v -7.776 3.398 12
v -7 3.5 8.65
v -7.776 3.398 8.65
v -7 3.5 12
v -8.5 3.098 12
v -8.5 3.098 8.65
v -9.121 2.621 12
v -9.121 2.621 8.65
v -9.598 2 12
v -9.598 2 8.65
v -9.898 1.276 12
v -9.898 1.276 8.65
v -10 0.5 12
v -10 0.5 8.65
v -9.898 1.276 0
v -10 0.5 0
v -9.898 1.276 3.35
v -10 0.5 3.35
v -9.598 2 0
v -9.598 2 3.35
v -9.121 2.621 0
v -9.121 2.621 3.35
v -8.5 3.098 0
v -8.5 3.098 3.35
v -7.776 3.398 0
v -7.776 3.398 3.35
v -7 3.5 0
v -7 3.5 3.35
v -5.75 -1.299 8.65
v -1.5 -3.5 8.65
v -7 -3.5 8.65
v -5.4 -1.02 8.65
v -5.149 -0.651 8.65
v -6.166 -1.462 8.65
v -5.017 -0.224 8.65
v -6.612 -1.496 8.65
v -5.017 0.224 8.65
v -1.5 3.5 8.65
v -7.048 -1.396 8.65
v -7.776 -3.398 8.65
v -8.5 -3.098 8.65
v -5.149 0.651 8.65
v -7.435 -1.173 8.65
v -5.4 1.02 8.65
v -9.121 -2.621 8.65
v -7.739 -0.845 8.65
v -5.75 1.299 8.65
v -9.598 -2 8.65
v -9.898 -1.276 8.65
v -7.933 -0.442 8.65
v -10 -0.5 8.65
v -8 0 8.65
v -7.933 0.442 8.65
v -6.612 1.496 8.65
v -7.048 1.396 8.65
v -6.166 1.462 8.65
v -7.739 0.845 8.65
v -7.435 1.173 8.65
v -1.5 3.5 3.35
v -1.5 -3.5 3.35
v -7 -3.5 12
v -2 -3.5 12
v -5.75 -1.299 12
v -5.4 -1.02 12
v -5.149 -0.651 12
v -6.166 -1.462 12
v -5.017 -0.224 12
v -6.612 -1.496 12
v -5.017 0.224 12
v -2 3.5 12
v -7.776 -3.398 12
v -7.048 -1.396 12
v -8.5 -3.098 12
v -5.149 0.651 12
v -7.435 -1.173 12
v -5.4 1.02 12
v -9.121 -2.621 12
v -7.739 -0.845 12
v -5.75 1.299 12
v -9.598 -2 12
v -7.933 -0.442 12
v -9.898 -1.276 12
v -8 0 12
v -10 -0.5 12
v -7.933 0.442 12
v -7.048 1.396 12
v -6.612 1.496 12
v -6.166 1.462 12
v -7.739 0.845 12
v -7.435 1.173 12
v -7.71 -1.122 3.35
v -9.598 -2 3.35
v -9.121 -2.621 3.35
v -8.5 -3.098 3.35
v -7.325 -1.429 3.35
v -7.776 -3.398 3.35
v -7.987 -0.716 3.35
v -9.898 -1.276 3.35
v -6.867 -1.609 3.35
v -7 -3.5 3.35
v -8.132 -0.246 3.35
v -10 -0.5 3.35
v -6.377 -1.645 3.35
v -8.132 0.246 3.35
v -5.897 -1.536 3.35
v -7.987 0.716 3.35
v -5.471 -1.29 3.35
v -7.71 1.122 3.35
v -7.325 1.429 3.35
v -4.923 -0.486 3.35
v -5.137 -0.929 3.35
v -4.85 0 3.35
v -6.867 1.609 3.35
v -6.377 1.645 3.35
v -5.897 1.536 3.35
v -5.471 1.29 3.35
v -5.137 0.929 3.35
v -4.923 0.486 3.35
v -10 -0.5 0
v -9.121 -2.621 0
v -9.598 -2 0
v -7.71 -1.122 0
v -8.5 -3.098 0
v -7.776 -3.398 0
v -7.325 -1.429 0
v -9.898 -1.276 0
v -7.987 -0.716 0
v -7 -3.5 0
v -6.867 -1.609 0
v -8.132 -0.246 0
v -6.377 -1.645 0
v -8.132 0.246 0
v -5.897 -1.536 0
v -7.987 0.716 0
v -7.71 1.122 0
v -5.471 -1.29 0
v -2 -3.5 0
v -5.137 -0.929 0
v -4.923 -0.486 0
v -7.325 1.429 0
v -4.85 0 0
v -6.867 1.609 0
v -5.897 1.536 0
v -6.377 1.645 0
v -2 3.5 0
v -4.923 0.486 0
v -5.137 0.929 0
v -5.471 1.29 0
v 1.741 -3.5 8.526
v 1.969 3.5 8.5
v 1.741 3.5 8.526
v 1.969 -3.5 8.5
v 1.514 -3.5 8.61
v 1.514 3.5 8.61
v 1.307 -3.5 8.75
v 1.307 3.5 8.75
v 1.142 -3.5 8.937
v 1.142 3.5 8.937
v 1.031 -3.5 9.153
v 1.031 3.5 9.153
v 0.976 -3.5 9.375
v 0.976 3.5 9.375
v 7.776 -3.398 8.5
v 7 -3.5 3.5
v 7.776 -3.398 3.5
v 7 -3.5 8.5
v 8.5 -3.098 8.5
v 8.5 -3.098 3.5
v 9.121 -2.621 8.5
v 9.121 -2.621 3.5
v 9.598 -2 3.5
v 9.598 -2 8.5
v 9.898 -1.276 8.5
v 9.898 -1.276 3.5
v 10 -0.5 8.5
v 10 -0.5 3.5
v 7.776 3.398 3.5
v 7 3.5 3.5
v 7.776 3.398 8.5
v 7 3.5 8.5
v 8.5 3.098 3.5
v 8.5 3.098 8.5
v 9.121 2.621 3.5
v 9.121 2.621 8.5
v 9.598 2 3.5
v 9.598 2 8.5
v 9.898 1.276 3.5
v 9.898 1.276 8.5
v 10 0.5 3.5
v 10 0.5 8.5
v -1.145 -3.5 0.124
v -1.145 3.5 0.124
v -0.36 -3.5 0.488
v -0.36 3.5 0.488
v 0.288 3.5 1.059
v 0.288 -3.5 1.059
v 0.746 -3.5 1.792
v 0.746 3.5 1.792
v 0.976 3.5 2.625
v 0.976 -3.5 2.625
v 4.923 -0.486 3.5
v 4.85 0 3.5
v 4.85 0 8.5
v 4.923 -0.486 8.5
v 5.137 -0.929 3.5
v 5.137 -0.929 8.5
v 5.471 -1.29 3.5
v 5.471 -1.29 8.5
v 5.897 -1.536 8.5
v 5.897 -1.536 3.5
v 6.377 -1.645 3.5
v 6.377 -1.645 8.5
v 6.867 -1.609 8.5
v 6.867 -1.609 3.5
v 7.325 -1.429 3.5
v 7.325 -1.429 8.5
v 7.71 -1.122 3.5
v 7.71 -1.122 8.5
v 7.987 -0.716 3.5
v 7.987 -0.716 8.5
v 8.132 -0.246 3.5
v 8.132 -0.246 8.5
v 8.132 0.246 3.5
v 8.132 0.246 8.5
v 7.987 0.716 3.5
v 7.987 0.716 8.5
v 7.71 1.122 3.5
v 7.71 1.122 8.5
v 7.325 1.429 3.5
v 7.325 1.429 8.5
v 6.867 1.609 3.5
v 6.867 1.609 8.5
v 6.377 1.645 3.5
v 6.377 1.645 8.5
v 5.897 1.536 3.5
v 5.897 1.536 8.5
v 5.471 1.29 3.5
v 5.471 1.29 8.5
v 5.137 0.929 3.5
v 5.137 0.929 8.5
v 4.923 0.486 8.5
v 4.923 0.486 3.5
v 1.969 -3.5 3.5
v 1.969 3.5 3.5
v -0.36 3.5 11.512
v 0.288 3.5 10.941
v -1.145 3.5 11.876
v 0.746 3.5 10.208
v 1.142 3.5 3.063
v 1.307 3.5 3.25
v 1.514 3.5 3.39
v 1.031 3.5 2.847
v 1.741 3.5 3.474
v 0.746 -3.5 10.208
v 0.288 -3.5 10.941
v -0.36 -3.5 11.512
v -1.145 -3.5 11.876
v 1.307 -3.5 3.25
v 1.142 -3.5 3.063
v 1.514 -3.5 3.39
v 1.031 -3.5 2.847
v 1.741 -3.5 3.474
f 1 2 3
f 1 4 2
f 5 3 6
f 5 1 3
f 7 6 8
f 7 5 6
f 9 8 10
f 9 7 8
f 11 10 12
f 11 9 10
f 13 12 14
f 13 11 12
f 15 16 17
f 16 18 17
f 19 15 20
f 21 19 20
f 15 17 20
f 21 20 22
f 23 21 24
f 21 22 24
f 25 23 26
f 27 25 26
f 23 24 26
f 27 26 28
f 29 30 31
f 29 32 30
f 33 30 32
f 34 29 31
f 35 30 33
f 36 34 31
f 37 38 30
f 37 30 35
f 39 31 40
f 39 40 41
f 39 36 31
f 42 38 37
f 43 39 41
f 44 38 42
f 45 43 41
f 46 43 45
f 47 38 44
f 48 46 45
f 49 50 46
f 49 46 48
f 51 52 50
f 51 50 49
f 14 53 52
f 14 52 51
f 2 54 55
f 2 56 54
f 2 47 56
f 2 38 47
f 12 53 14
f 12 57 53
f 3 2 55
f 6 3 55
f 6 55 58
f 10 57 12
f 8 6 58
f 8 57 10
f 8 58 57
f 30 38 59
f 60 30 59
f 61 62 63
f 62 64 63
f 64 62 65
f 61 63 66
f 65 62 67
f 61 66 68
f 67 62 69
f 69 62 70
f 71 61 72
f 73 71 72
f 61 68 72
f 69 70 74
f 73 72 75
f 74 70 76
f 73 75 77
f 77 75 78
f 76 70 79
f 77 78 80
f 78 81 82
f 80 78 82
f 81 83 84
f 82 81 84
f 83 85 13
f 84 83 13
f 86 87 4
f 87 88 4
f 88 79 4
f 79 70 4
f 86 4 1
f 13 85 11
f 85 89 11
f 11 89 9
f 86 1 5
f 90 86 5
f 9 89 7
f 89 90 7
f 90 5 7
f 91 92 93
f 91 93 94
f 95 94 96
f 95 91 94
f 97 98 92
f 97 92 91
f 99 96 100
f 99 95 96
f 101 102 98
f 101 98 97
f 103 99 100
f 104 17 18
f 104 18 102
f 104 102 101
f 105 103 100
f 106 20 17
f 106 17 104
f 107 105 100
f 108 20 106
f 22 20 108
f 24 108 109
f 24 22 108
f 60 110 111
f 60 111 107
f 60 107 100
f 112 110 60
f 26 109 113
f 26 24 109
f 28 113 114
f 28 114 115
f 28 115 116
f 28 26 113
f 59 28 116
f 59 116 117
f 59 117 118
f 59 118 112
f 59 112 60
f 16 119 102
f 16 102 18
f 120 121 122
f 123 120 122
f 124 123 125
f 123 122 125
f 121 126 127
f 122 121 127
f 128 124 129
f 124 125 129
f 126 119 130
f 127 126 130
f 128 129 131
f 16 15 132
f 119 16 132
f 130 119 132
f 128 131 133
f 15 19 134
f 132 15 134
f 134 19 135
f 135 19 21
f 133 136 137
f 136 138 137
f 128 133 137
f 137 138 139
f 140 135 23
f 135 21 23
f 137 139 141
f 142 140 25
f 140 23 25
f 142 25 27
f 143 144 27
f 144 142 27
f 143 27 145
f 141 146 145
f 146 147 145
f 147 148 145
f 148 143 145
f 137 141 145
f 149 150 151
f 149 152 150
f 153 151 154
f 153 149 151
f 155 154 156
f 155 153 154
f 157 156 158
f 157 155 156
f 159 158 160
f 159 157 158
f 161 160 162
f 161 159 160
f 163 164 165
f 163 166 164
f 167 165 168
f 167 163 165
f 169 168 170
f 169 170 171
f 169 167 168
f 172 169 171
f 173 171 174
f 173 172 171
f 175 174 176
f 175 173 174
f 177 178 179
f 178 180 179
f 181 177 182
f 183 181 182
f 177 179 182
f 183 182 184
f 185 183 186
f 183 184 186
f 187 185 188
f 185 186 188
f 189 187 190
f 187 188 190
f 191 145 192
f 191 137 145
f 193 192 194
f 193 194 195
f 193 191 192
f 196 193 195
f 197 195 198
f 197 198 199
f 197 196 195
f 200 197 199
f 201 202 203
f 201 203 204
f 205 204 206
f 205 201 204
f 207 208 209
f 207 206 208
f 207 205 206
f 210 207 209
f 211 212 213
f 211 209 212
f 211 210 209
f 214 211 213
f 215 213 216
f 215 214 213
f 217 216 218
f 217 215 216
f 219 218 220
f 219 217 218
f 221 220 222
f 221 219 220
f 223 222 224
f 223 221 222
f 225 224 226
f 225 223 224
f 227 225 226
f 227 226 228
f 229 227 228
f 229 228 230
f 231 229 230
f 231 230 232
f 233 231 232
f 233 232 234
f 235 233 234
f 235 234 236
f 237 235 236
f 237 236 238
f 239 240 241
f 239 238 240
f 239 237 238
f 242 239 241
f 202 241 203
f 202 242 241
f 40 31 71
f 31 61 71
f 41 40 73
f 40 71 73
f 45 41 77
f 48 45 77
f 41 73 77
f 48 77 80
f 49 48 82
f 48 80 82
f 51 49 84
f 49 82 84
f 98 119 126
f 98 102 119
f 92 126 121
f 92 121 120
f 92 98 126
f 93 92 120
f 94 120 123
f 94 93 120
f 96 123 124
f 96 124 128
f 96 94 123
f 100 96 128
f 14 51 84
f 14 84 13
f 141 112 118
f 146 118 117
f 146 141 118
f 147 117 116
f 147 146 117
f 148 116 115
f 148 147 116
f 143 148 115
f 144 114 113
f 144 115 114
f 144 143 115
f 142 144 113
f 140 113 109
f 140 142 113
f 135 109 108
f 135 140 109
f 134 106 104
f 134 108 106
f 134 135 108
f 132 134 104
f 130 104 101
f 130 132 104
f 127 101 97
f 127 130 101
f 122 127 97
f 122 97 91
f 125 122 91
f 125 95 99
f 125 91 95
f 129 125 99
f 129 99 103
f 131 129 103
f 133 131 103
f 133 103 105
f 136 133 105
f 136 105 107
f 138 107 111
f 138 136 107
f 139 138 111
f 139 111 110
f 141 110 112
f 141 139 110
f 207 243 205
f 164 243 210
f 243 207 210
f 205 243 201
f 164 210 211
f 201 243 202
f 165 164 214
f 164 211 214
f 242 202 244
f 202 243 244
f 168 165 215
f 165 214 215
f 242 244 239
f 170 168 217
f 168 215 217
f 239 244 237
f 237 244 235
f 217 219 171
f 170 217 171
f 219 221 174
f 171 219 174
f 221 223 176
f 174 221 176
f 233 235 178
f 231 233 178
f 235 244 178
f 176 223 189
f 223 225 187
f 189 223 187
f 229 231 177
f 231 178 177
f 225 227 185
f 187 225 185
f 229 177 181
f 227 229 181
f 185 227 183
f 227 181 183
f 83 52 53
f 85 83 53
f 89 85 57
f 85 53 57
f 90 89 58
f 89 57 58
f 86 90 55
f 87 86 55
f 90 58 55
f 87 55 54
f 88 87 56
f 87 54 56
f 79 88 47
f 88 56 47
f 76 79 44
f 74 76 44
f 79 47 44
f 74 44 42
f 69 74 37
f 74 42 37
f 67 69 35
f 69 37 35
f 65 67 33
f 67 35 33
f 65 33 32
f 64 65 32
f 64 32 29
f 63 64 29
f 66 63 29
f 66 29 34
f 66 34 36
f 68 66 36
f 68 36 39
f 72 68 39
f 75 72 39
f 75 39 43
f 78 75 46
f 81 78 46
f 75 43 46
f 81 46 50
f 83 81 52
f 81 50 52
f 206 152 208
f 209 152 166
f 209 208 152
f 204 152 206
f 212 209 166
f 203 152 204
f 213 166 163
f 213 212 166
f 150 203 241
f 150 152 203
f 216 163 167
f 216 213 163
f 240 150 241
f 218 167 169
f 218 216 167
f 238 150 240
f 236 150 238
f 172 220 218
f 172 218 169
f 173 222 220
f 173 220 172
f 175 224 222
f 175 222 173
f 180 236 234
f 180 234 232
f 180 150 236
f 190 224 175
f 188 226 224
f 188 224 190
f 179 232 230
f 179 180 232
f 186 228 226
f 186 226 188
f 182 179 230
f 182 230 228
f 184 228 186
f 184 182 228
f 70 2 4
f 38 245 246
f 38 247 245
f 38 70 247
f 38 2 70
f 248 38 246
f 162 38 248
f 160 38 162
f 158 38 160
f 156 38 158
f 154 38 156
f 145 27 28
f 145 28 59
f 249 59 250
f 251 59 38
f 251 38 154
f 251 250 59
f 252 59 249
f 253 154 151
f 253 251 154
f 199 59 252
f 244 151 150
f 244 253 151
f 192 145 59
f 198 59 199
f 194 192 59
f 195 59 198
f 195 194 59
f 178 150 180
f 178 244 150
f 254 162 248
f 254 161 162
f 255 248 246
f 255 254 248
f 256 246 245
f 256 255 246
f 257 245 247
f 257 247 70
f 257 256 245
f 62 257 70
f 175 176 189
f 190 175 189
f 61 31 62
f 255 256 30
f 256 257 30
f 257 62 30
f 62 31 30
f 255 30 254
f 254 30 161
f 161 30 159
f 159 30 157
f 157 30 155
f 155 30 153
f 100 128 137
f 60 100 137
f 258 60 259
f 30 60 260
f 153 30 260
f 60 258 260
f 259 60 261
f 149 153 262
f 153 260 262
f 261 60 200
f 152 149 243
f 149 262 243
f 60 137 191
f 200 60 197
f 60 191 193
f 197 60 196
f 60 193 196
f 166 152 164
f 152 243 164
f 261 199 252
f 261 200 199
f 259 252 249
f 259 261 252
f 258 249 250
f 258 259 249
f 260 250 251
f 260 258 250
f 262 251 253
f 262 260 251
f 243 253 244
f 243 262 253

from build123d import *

# Parameters (mm, degrees)
SKETCH_1_W          = 20
SKETCH_1_H          = 7
SKETCH_1_R          = 1.65
EXTRUDE_1_DEPTH     = 12
SKETCH_2_W          = 8.5
SKETCH_2_H          = 5.3
CUT_EXTRUDE_1_DEPTH = 12
SKETCH_3_W          = 9
SKETCH_3_H          = 3.5
CUT_EXTRUDE_2_DEPTH = 12
FILLET_1_R          = 3
FILLET_2_R          = 3
FILLET_3_R          = 1
SKETCH_5_R          = 1.65
SKETCH_5_R_2        = 1.5
EXTRUDE_2_DEPTH     = 3.35


with BuildPart() as part:
    # 草图1 → 凸台-拉伸1 (new body)
    with BuildSketch(Plane.XY):
        Rectangle(SKETCH_1_W, SKETCH_1_H)
        with Locations((-6.5, 0)):
            Circle(SKETCH_1_R, mode=Mode.SUBTRACT)
        with Locations(Location((6.5, 0, 0), (0, 0, 180))):
            Circle(SKETCH_1_R, mode=Mode.SUBTRACT)
    extrude(amount=EXTRUDE_1_DEPTH)

    # 草图2 → 切除-拉伸1 (cut)
    with BuildSketch(Plane(origin=(0, 3.5, 0), x_dir=(1, 0, 0), z_dir=(0, 1, 0))):
        with Locations((-5.75, -6)):
            Rectangle(SKETCH_2_W, SKETCH_2_H)
    extrude(amount=-CUT_EXTRUDE_1_DEPTH, mode=Mode.SUBTRACT)

    # 草图3 → 切除-拉伸2 (cut)
    with BuildSketch(Plane(origin=(0, 3.5, 0), x_dir=(1, 0, 0), z_dir=(0, 1, 0))):
        with Locations((5.5, -1.75)):
            Rectangle(SKETCH_3_W, SKETCH_3_H)
        with Locations((5.5, -10.25)):
            Rectangle(SKETCH_3_W, SKETCH_3_H)
    extrude(amount=-CUT_EXTRUDE_2_DEPTH, mode=Mode.SUBTRACT)

    # 圆角1
    fillet_1_edges = [part.edges().sort_by_distance(p)[0] for p in [
        (-10, -3.5, 1.675),
        (-10, 3.5, 1.675),
        (10, -3.5, 6),
        (10, 3.5, 6),
        (-10, -3.5, 10.325),
        (-10, 3.5, 10.325),
    ]]
    fillet(fillet_1_edges, radius=FILLET_1_R)

    # 圆角2
    fillet_2_edges = [part.edges().sort_by_distance(p)[0] for p in [
        (1, 0, 0),
        (1, 0, 12),
    ]]
    fillet(fillet_2_edges, radius=FILLET_2_R)

    # 圆角3
    fillet_3_edges = [part.edges().sort_by_distance(p)[0] for p in [
        (1, 0, 3.5),
        (1, 0, 8.5),
    ]]
    fillet(fillet_3_edges, radius=FILLET_3_R)

    # 草图5 → 凸台-拉伸2 (add)
    with BuildSketch(Plane(origin=(0, 0, 8.65), x_dir=(-1, 0, 0), z_dir=(0, 0, -1))):
        with Locations((6.5, 0)):
            Circle(SKETCH_5_R)
        with Locations((6.5, 0)):
            Circle(SKETCH_5_R_2, mode=Mode.SUBTRACT)
    extrude(amount=-EXTRUDE_2_DEPTH)


solid = part.part
